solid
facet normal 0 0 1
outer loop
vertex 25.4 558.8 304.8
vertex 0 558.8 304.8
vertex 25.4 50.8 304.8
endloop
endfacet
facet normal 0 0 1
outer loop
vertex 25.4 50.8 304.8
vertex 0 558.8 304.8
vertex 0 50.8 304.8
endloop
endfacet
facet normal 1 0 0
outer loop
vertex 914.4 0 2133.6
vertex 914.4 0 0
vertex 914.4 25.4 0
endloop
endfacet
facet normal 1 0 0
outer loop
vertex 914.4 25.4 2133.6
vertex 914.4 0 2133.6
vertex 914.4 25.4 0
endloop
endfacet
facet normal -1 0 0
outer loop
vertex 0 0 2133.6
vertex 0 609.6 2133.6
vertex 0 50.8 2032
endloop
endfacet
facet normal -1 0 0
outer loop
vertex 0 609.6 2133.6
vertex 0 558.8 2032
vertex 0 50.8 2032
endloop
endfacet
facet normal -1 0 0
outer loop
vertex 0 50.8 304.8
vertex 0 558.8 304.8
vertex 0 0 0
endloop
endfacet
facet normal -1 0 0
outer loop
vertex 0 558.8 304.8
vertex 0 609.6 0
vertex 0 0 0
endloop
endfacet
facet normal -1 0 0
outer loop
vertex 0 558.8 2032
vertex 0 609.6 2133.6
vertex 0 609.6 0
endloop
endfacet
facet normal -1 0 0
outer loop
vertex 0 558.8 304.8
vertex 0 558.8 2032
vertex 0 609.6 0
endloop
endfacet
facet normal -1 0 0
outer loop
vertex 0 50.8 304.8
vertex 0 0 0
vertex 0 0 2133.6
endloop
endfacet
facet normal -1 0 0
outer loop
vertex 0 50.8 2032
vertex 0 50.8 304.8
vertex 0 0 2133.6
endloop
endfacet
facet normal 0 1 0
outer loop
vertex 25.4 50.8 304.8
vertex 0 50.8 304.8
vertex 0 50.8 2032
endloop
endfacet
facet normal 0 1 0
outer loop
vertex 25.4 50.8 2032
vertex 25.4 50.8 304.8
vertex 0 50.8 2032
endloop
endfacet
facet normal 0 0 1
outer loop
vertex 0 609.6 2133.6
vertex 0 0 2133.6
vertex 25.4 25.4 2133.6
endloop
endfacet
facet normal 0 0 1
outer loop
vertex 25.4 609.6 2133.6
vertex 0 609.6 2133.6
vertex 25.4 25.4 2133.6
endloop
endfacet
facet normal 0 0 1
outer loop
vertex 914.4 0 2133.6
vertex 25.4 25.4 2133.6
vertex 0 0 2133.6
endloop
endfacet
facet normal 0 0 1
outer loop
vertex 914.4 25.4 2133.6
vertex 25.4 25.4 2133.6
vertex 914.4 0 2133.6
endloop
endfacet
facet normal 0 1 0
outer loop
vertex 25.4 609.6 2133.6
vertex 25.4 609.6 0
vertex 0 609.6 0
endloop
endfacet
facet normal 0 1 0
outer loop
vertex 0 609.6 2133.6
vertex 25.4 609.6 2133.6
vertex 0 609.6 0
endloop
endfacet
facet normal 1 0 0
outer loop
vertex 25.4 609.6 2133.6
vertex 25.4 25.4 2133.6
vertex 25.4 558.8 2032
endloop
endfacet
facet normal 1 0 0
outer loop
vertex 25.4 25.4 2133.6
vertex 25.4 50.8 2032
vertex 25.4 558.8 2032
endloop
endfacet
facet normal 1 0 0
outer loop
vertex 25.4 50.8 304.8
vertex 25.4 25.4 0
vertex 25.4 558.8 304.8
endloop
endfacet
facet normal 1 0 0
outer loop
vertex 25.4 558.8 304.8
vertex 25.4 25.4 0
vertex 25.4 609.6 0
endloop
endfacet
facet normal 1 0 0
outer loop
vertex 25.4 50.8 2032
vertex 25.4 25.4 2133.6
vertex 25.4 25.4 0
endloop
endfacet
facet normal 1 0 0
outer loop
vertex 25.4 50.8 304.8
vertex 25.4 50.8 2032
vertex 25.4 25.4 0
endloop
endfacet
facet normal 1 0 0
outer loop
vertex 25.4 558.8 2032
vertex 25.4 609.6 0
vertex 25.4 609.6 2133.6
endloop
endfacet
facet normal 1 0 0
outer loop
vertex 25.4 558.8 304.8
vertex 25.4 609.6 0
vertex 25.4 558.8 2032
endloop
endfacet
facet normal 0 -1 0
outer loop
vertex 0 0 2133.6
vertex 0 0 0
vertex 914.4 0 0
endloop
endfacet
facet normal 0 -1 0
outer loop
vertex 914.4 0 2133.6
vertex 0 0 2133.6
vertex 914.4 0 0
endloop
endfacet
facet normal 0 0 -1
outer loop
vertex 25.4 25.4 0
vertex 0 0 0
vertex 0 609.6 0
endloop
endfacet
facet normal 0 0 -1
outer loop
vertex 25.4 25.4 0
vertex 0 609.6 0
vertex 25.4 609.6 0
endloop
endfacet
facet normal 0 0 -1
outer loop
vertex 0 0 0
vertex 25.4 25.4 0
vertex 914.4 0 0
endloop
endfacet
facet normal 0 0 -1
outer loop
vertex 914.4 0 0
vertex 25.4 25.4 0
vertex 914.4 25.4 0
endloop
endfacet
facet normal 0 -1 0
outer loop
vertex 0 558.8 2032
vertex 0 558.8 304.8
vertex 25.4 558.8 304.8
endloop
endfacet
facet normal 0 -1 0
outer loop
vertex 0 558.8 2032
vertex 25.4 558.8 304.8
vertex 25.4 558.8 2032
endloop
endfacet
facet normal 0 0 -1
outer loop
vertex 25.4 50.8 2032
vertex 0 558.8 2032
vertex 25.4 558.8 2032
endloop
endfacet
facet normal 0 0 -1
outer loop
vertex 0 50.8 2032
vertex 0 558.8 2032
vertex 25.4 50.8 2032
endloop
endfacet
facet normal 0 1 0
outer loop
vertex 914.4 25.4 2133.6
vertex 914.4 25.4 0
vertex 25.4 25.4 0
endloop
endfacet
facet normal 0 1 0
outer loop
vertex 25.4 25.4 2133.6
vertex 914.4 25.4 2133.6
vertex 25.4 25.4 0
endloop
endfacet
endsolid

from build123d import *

# Parameters (mm, degrees)
F1_DEPTH = 2133.6
F2_W     = 508
F2_H     = 1727.2
F3_DEPTH = 914.401


with BuildPart() as f1:
    # F0 (on Top) → F1 (new body)
    with BuildSketch(Plane.XY):
        Polygon((0, 609.6), (0, 0), (914.4, 0), (914.4, 25.4), (25.4, 25.4), (25.4, 609.6), align=None)
    extrude(amount=F1_DEPTH)

    # F2 (on face) → F3 (cut, through all)
    with BuildSketch(Plane(origin=(0, 0, 0), x_dir=(0, -1, 0), z_dir=(-1, 0, 0))):
        with Locations((-304.8, 1168.4)):
            Rectangle(F2_W, F2_H)
    extrude(amount=-F3_DEPTH, mode=Mode.SUBTRACT)


solid = f1.part
